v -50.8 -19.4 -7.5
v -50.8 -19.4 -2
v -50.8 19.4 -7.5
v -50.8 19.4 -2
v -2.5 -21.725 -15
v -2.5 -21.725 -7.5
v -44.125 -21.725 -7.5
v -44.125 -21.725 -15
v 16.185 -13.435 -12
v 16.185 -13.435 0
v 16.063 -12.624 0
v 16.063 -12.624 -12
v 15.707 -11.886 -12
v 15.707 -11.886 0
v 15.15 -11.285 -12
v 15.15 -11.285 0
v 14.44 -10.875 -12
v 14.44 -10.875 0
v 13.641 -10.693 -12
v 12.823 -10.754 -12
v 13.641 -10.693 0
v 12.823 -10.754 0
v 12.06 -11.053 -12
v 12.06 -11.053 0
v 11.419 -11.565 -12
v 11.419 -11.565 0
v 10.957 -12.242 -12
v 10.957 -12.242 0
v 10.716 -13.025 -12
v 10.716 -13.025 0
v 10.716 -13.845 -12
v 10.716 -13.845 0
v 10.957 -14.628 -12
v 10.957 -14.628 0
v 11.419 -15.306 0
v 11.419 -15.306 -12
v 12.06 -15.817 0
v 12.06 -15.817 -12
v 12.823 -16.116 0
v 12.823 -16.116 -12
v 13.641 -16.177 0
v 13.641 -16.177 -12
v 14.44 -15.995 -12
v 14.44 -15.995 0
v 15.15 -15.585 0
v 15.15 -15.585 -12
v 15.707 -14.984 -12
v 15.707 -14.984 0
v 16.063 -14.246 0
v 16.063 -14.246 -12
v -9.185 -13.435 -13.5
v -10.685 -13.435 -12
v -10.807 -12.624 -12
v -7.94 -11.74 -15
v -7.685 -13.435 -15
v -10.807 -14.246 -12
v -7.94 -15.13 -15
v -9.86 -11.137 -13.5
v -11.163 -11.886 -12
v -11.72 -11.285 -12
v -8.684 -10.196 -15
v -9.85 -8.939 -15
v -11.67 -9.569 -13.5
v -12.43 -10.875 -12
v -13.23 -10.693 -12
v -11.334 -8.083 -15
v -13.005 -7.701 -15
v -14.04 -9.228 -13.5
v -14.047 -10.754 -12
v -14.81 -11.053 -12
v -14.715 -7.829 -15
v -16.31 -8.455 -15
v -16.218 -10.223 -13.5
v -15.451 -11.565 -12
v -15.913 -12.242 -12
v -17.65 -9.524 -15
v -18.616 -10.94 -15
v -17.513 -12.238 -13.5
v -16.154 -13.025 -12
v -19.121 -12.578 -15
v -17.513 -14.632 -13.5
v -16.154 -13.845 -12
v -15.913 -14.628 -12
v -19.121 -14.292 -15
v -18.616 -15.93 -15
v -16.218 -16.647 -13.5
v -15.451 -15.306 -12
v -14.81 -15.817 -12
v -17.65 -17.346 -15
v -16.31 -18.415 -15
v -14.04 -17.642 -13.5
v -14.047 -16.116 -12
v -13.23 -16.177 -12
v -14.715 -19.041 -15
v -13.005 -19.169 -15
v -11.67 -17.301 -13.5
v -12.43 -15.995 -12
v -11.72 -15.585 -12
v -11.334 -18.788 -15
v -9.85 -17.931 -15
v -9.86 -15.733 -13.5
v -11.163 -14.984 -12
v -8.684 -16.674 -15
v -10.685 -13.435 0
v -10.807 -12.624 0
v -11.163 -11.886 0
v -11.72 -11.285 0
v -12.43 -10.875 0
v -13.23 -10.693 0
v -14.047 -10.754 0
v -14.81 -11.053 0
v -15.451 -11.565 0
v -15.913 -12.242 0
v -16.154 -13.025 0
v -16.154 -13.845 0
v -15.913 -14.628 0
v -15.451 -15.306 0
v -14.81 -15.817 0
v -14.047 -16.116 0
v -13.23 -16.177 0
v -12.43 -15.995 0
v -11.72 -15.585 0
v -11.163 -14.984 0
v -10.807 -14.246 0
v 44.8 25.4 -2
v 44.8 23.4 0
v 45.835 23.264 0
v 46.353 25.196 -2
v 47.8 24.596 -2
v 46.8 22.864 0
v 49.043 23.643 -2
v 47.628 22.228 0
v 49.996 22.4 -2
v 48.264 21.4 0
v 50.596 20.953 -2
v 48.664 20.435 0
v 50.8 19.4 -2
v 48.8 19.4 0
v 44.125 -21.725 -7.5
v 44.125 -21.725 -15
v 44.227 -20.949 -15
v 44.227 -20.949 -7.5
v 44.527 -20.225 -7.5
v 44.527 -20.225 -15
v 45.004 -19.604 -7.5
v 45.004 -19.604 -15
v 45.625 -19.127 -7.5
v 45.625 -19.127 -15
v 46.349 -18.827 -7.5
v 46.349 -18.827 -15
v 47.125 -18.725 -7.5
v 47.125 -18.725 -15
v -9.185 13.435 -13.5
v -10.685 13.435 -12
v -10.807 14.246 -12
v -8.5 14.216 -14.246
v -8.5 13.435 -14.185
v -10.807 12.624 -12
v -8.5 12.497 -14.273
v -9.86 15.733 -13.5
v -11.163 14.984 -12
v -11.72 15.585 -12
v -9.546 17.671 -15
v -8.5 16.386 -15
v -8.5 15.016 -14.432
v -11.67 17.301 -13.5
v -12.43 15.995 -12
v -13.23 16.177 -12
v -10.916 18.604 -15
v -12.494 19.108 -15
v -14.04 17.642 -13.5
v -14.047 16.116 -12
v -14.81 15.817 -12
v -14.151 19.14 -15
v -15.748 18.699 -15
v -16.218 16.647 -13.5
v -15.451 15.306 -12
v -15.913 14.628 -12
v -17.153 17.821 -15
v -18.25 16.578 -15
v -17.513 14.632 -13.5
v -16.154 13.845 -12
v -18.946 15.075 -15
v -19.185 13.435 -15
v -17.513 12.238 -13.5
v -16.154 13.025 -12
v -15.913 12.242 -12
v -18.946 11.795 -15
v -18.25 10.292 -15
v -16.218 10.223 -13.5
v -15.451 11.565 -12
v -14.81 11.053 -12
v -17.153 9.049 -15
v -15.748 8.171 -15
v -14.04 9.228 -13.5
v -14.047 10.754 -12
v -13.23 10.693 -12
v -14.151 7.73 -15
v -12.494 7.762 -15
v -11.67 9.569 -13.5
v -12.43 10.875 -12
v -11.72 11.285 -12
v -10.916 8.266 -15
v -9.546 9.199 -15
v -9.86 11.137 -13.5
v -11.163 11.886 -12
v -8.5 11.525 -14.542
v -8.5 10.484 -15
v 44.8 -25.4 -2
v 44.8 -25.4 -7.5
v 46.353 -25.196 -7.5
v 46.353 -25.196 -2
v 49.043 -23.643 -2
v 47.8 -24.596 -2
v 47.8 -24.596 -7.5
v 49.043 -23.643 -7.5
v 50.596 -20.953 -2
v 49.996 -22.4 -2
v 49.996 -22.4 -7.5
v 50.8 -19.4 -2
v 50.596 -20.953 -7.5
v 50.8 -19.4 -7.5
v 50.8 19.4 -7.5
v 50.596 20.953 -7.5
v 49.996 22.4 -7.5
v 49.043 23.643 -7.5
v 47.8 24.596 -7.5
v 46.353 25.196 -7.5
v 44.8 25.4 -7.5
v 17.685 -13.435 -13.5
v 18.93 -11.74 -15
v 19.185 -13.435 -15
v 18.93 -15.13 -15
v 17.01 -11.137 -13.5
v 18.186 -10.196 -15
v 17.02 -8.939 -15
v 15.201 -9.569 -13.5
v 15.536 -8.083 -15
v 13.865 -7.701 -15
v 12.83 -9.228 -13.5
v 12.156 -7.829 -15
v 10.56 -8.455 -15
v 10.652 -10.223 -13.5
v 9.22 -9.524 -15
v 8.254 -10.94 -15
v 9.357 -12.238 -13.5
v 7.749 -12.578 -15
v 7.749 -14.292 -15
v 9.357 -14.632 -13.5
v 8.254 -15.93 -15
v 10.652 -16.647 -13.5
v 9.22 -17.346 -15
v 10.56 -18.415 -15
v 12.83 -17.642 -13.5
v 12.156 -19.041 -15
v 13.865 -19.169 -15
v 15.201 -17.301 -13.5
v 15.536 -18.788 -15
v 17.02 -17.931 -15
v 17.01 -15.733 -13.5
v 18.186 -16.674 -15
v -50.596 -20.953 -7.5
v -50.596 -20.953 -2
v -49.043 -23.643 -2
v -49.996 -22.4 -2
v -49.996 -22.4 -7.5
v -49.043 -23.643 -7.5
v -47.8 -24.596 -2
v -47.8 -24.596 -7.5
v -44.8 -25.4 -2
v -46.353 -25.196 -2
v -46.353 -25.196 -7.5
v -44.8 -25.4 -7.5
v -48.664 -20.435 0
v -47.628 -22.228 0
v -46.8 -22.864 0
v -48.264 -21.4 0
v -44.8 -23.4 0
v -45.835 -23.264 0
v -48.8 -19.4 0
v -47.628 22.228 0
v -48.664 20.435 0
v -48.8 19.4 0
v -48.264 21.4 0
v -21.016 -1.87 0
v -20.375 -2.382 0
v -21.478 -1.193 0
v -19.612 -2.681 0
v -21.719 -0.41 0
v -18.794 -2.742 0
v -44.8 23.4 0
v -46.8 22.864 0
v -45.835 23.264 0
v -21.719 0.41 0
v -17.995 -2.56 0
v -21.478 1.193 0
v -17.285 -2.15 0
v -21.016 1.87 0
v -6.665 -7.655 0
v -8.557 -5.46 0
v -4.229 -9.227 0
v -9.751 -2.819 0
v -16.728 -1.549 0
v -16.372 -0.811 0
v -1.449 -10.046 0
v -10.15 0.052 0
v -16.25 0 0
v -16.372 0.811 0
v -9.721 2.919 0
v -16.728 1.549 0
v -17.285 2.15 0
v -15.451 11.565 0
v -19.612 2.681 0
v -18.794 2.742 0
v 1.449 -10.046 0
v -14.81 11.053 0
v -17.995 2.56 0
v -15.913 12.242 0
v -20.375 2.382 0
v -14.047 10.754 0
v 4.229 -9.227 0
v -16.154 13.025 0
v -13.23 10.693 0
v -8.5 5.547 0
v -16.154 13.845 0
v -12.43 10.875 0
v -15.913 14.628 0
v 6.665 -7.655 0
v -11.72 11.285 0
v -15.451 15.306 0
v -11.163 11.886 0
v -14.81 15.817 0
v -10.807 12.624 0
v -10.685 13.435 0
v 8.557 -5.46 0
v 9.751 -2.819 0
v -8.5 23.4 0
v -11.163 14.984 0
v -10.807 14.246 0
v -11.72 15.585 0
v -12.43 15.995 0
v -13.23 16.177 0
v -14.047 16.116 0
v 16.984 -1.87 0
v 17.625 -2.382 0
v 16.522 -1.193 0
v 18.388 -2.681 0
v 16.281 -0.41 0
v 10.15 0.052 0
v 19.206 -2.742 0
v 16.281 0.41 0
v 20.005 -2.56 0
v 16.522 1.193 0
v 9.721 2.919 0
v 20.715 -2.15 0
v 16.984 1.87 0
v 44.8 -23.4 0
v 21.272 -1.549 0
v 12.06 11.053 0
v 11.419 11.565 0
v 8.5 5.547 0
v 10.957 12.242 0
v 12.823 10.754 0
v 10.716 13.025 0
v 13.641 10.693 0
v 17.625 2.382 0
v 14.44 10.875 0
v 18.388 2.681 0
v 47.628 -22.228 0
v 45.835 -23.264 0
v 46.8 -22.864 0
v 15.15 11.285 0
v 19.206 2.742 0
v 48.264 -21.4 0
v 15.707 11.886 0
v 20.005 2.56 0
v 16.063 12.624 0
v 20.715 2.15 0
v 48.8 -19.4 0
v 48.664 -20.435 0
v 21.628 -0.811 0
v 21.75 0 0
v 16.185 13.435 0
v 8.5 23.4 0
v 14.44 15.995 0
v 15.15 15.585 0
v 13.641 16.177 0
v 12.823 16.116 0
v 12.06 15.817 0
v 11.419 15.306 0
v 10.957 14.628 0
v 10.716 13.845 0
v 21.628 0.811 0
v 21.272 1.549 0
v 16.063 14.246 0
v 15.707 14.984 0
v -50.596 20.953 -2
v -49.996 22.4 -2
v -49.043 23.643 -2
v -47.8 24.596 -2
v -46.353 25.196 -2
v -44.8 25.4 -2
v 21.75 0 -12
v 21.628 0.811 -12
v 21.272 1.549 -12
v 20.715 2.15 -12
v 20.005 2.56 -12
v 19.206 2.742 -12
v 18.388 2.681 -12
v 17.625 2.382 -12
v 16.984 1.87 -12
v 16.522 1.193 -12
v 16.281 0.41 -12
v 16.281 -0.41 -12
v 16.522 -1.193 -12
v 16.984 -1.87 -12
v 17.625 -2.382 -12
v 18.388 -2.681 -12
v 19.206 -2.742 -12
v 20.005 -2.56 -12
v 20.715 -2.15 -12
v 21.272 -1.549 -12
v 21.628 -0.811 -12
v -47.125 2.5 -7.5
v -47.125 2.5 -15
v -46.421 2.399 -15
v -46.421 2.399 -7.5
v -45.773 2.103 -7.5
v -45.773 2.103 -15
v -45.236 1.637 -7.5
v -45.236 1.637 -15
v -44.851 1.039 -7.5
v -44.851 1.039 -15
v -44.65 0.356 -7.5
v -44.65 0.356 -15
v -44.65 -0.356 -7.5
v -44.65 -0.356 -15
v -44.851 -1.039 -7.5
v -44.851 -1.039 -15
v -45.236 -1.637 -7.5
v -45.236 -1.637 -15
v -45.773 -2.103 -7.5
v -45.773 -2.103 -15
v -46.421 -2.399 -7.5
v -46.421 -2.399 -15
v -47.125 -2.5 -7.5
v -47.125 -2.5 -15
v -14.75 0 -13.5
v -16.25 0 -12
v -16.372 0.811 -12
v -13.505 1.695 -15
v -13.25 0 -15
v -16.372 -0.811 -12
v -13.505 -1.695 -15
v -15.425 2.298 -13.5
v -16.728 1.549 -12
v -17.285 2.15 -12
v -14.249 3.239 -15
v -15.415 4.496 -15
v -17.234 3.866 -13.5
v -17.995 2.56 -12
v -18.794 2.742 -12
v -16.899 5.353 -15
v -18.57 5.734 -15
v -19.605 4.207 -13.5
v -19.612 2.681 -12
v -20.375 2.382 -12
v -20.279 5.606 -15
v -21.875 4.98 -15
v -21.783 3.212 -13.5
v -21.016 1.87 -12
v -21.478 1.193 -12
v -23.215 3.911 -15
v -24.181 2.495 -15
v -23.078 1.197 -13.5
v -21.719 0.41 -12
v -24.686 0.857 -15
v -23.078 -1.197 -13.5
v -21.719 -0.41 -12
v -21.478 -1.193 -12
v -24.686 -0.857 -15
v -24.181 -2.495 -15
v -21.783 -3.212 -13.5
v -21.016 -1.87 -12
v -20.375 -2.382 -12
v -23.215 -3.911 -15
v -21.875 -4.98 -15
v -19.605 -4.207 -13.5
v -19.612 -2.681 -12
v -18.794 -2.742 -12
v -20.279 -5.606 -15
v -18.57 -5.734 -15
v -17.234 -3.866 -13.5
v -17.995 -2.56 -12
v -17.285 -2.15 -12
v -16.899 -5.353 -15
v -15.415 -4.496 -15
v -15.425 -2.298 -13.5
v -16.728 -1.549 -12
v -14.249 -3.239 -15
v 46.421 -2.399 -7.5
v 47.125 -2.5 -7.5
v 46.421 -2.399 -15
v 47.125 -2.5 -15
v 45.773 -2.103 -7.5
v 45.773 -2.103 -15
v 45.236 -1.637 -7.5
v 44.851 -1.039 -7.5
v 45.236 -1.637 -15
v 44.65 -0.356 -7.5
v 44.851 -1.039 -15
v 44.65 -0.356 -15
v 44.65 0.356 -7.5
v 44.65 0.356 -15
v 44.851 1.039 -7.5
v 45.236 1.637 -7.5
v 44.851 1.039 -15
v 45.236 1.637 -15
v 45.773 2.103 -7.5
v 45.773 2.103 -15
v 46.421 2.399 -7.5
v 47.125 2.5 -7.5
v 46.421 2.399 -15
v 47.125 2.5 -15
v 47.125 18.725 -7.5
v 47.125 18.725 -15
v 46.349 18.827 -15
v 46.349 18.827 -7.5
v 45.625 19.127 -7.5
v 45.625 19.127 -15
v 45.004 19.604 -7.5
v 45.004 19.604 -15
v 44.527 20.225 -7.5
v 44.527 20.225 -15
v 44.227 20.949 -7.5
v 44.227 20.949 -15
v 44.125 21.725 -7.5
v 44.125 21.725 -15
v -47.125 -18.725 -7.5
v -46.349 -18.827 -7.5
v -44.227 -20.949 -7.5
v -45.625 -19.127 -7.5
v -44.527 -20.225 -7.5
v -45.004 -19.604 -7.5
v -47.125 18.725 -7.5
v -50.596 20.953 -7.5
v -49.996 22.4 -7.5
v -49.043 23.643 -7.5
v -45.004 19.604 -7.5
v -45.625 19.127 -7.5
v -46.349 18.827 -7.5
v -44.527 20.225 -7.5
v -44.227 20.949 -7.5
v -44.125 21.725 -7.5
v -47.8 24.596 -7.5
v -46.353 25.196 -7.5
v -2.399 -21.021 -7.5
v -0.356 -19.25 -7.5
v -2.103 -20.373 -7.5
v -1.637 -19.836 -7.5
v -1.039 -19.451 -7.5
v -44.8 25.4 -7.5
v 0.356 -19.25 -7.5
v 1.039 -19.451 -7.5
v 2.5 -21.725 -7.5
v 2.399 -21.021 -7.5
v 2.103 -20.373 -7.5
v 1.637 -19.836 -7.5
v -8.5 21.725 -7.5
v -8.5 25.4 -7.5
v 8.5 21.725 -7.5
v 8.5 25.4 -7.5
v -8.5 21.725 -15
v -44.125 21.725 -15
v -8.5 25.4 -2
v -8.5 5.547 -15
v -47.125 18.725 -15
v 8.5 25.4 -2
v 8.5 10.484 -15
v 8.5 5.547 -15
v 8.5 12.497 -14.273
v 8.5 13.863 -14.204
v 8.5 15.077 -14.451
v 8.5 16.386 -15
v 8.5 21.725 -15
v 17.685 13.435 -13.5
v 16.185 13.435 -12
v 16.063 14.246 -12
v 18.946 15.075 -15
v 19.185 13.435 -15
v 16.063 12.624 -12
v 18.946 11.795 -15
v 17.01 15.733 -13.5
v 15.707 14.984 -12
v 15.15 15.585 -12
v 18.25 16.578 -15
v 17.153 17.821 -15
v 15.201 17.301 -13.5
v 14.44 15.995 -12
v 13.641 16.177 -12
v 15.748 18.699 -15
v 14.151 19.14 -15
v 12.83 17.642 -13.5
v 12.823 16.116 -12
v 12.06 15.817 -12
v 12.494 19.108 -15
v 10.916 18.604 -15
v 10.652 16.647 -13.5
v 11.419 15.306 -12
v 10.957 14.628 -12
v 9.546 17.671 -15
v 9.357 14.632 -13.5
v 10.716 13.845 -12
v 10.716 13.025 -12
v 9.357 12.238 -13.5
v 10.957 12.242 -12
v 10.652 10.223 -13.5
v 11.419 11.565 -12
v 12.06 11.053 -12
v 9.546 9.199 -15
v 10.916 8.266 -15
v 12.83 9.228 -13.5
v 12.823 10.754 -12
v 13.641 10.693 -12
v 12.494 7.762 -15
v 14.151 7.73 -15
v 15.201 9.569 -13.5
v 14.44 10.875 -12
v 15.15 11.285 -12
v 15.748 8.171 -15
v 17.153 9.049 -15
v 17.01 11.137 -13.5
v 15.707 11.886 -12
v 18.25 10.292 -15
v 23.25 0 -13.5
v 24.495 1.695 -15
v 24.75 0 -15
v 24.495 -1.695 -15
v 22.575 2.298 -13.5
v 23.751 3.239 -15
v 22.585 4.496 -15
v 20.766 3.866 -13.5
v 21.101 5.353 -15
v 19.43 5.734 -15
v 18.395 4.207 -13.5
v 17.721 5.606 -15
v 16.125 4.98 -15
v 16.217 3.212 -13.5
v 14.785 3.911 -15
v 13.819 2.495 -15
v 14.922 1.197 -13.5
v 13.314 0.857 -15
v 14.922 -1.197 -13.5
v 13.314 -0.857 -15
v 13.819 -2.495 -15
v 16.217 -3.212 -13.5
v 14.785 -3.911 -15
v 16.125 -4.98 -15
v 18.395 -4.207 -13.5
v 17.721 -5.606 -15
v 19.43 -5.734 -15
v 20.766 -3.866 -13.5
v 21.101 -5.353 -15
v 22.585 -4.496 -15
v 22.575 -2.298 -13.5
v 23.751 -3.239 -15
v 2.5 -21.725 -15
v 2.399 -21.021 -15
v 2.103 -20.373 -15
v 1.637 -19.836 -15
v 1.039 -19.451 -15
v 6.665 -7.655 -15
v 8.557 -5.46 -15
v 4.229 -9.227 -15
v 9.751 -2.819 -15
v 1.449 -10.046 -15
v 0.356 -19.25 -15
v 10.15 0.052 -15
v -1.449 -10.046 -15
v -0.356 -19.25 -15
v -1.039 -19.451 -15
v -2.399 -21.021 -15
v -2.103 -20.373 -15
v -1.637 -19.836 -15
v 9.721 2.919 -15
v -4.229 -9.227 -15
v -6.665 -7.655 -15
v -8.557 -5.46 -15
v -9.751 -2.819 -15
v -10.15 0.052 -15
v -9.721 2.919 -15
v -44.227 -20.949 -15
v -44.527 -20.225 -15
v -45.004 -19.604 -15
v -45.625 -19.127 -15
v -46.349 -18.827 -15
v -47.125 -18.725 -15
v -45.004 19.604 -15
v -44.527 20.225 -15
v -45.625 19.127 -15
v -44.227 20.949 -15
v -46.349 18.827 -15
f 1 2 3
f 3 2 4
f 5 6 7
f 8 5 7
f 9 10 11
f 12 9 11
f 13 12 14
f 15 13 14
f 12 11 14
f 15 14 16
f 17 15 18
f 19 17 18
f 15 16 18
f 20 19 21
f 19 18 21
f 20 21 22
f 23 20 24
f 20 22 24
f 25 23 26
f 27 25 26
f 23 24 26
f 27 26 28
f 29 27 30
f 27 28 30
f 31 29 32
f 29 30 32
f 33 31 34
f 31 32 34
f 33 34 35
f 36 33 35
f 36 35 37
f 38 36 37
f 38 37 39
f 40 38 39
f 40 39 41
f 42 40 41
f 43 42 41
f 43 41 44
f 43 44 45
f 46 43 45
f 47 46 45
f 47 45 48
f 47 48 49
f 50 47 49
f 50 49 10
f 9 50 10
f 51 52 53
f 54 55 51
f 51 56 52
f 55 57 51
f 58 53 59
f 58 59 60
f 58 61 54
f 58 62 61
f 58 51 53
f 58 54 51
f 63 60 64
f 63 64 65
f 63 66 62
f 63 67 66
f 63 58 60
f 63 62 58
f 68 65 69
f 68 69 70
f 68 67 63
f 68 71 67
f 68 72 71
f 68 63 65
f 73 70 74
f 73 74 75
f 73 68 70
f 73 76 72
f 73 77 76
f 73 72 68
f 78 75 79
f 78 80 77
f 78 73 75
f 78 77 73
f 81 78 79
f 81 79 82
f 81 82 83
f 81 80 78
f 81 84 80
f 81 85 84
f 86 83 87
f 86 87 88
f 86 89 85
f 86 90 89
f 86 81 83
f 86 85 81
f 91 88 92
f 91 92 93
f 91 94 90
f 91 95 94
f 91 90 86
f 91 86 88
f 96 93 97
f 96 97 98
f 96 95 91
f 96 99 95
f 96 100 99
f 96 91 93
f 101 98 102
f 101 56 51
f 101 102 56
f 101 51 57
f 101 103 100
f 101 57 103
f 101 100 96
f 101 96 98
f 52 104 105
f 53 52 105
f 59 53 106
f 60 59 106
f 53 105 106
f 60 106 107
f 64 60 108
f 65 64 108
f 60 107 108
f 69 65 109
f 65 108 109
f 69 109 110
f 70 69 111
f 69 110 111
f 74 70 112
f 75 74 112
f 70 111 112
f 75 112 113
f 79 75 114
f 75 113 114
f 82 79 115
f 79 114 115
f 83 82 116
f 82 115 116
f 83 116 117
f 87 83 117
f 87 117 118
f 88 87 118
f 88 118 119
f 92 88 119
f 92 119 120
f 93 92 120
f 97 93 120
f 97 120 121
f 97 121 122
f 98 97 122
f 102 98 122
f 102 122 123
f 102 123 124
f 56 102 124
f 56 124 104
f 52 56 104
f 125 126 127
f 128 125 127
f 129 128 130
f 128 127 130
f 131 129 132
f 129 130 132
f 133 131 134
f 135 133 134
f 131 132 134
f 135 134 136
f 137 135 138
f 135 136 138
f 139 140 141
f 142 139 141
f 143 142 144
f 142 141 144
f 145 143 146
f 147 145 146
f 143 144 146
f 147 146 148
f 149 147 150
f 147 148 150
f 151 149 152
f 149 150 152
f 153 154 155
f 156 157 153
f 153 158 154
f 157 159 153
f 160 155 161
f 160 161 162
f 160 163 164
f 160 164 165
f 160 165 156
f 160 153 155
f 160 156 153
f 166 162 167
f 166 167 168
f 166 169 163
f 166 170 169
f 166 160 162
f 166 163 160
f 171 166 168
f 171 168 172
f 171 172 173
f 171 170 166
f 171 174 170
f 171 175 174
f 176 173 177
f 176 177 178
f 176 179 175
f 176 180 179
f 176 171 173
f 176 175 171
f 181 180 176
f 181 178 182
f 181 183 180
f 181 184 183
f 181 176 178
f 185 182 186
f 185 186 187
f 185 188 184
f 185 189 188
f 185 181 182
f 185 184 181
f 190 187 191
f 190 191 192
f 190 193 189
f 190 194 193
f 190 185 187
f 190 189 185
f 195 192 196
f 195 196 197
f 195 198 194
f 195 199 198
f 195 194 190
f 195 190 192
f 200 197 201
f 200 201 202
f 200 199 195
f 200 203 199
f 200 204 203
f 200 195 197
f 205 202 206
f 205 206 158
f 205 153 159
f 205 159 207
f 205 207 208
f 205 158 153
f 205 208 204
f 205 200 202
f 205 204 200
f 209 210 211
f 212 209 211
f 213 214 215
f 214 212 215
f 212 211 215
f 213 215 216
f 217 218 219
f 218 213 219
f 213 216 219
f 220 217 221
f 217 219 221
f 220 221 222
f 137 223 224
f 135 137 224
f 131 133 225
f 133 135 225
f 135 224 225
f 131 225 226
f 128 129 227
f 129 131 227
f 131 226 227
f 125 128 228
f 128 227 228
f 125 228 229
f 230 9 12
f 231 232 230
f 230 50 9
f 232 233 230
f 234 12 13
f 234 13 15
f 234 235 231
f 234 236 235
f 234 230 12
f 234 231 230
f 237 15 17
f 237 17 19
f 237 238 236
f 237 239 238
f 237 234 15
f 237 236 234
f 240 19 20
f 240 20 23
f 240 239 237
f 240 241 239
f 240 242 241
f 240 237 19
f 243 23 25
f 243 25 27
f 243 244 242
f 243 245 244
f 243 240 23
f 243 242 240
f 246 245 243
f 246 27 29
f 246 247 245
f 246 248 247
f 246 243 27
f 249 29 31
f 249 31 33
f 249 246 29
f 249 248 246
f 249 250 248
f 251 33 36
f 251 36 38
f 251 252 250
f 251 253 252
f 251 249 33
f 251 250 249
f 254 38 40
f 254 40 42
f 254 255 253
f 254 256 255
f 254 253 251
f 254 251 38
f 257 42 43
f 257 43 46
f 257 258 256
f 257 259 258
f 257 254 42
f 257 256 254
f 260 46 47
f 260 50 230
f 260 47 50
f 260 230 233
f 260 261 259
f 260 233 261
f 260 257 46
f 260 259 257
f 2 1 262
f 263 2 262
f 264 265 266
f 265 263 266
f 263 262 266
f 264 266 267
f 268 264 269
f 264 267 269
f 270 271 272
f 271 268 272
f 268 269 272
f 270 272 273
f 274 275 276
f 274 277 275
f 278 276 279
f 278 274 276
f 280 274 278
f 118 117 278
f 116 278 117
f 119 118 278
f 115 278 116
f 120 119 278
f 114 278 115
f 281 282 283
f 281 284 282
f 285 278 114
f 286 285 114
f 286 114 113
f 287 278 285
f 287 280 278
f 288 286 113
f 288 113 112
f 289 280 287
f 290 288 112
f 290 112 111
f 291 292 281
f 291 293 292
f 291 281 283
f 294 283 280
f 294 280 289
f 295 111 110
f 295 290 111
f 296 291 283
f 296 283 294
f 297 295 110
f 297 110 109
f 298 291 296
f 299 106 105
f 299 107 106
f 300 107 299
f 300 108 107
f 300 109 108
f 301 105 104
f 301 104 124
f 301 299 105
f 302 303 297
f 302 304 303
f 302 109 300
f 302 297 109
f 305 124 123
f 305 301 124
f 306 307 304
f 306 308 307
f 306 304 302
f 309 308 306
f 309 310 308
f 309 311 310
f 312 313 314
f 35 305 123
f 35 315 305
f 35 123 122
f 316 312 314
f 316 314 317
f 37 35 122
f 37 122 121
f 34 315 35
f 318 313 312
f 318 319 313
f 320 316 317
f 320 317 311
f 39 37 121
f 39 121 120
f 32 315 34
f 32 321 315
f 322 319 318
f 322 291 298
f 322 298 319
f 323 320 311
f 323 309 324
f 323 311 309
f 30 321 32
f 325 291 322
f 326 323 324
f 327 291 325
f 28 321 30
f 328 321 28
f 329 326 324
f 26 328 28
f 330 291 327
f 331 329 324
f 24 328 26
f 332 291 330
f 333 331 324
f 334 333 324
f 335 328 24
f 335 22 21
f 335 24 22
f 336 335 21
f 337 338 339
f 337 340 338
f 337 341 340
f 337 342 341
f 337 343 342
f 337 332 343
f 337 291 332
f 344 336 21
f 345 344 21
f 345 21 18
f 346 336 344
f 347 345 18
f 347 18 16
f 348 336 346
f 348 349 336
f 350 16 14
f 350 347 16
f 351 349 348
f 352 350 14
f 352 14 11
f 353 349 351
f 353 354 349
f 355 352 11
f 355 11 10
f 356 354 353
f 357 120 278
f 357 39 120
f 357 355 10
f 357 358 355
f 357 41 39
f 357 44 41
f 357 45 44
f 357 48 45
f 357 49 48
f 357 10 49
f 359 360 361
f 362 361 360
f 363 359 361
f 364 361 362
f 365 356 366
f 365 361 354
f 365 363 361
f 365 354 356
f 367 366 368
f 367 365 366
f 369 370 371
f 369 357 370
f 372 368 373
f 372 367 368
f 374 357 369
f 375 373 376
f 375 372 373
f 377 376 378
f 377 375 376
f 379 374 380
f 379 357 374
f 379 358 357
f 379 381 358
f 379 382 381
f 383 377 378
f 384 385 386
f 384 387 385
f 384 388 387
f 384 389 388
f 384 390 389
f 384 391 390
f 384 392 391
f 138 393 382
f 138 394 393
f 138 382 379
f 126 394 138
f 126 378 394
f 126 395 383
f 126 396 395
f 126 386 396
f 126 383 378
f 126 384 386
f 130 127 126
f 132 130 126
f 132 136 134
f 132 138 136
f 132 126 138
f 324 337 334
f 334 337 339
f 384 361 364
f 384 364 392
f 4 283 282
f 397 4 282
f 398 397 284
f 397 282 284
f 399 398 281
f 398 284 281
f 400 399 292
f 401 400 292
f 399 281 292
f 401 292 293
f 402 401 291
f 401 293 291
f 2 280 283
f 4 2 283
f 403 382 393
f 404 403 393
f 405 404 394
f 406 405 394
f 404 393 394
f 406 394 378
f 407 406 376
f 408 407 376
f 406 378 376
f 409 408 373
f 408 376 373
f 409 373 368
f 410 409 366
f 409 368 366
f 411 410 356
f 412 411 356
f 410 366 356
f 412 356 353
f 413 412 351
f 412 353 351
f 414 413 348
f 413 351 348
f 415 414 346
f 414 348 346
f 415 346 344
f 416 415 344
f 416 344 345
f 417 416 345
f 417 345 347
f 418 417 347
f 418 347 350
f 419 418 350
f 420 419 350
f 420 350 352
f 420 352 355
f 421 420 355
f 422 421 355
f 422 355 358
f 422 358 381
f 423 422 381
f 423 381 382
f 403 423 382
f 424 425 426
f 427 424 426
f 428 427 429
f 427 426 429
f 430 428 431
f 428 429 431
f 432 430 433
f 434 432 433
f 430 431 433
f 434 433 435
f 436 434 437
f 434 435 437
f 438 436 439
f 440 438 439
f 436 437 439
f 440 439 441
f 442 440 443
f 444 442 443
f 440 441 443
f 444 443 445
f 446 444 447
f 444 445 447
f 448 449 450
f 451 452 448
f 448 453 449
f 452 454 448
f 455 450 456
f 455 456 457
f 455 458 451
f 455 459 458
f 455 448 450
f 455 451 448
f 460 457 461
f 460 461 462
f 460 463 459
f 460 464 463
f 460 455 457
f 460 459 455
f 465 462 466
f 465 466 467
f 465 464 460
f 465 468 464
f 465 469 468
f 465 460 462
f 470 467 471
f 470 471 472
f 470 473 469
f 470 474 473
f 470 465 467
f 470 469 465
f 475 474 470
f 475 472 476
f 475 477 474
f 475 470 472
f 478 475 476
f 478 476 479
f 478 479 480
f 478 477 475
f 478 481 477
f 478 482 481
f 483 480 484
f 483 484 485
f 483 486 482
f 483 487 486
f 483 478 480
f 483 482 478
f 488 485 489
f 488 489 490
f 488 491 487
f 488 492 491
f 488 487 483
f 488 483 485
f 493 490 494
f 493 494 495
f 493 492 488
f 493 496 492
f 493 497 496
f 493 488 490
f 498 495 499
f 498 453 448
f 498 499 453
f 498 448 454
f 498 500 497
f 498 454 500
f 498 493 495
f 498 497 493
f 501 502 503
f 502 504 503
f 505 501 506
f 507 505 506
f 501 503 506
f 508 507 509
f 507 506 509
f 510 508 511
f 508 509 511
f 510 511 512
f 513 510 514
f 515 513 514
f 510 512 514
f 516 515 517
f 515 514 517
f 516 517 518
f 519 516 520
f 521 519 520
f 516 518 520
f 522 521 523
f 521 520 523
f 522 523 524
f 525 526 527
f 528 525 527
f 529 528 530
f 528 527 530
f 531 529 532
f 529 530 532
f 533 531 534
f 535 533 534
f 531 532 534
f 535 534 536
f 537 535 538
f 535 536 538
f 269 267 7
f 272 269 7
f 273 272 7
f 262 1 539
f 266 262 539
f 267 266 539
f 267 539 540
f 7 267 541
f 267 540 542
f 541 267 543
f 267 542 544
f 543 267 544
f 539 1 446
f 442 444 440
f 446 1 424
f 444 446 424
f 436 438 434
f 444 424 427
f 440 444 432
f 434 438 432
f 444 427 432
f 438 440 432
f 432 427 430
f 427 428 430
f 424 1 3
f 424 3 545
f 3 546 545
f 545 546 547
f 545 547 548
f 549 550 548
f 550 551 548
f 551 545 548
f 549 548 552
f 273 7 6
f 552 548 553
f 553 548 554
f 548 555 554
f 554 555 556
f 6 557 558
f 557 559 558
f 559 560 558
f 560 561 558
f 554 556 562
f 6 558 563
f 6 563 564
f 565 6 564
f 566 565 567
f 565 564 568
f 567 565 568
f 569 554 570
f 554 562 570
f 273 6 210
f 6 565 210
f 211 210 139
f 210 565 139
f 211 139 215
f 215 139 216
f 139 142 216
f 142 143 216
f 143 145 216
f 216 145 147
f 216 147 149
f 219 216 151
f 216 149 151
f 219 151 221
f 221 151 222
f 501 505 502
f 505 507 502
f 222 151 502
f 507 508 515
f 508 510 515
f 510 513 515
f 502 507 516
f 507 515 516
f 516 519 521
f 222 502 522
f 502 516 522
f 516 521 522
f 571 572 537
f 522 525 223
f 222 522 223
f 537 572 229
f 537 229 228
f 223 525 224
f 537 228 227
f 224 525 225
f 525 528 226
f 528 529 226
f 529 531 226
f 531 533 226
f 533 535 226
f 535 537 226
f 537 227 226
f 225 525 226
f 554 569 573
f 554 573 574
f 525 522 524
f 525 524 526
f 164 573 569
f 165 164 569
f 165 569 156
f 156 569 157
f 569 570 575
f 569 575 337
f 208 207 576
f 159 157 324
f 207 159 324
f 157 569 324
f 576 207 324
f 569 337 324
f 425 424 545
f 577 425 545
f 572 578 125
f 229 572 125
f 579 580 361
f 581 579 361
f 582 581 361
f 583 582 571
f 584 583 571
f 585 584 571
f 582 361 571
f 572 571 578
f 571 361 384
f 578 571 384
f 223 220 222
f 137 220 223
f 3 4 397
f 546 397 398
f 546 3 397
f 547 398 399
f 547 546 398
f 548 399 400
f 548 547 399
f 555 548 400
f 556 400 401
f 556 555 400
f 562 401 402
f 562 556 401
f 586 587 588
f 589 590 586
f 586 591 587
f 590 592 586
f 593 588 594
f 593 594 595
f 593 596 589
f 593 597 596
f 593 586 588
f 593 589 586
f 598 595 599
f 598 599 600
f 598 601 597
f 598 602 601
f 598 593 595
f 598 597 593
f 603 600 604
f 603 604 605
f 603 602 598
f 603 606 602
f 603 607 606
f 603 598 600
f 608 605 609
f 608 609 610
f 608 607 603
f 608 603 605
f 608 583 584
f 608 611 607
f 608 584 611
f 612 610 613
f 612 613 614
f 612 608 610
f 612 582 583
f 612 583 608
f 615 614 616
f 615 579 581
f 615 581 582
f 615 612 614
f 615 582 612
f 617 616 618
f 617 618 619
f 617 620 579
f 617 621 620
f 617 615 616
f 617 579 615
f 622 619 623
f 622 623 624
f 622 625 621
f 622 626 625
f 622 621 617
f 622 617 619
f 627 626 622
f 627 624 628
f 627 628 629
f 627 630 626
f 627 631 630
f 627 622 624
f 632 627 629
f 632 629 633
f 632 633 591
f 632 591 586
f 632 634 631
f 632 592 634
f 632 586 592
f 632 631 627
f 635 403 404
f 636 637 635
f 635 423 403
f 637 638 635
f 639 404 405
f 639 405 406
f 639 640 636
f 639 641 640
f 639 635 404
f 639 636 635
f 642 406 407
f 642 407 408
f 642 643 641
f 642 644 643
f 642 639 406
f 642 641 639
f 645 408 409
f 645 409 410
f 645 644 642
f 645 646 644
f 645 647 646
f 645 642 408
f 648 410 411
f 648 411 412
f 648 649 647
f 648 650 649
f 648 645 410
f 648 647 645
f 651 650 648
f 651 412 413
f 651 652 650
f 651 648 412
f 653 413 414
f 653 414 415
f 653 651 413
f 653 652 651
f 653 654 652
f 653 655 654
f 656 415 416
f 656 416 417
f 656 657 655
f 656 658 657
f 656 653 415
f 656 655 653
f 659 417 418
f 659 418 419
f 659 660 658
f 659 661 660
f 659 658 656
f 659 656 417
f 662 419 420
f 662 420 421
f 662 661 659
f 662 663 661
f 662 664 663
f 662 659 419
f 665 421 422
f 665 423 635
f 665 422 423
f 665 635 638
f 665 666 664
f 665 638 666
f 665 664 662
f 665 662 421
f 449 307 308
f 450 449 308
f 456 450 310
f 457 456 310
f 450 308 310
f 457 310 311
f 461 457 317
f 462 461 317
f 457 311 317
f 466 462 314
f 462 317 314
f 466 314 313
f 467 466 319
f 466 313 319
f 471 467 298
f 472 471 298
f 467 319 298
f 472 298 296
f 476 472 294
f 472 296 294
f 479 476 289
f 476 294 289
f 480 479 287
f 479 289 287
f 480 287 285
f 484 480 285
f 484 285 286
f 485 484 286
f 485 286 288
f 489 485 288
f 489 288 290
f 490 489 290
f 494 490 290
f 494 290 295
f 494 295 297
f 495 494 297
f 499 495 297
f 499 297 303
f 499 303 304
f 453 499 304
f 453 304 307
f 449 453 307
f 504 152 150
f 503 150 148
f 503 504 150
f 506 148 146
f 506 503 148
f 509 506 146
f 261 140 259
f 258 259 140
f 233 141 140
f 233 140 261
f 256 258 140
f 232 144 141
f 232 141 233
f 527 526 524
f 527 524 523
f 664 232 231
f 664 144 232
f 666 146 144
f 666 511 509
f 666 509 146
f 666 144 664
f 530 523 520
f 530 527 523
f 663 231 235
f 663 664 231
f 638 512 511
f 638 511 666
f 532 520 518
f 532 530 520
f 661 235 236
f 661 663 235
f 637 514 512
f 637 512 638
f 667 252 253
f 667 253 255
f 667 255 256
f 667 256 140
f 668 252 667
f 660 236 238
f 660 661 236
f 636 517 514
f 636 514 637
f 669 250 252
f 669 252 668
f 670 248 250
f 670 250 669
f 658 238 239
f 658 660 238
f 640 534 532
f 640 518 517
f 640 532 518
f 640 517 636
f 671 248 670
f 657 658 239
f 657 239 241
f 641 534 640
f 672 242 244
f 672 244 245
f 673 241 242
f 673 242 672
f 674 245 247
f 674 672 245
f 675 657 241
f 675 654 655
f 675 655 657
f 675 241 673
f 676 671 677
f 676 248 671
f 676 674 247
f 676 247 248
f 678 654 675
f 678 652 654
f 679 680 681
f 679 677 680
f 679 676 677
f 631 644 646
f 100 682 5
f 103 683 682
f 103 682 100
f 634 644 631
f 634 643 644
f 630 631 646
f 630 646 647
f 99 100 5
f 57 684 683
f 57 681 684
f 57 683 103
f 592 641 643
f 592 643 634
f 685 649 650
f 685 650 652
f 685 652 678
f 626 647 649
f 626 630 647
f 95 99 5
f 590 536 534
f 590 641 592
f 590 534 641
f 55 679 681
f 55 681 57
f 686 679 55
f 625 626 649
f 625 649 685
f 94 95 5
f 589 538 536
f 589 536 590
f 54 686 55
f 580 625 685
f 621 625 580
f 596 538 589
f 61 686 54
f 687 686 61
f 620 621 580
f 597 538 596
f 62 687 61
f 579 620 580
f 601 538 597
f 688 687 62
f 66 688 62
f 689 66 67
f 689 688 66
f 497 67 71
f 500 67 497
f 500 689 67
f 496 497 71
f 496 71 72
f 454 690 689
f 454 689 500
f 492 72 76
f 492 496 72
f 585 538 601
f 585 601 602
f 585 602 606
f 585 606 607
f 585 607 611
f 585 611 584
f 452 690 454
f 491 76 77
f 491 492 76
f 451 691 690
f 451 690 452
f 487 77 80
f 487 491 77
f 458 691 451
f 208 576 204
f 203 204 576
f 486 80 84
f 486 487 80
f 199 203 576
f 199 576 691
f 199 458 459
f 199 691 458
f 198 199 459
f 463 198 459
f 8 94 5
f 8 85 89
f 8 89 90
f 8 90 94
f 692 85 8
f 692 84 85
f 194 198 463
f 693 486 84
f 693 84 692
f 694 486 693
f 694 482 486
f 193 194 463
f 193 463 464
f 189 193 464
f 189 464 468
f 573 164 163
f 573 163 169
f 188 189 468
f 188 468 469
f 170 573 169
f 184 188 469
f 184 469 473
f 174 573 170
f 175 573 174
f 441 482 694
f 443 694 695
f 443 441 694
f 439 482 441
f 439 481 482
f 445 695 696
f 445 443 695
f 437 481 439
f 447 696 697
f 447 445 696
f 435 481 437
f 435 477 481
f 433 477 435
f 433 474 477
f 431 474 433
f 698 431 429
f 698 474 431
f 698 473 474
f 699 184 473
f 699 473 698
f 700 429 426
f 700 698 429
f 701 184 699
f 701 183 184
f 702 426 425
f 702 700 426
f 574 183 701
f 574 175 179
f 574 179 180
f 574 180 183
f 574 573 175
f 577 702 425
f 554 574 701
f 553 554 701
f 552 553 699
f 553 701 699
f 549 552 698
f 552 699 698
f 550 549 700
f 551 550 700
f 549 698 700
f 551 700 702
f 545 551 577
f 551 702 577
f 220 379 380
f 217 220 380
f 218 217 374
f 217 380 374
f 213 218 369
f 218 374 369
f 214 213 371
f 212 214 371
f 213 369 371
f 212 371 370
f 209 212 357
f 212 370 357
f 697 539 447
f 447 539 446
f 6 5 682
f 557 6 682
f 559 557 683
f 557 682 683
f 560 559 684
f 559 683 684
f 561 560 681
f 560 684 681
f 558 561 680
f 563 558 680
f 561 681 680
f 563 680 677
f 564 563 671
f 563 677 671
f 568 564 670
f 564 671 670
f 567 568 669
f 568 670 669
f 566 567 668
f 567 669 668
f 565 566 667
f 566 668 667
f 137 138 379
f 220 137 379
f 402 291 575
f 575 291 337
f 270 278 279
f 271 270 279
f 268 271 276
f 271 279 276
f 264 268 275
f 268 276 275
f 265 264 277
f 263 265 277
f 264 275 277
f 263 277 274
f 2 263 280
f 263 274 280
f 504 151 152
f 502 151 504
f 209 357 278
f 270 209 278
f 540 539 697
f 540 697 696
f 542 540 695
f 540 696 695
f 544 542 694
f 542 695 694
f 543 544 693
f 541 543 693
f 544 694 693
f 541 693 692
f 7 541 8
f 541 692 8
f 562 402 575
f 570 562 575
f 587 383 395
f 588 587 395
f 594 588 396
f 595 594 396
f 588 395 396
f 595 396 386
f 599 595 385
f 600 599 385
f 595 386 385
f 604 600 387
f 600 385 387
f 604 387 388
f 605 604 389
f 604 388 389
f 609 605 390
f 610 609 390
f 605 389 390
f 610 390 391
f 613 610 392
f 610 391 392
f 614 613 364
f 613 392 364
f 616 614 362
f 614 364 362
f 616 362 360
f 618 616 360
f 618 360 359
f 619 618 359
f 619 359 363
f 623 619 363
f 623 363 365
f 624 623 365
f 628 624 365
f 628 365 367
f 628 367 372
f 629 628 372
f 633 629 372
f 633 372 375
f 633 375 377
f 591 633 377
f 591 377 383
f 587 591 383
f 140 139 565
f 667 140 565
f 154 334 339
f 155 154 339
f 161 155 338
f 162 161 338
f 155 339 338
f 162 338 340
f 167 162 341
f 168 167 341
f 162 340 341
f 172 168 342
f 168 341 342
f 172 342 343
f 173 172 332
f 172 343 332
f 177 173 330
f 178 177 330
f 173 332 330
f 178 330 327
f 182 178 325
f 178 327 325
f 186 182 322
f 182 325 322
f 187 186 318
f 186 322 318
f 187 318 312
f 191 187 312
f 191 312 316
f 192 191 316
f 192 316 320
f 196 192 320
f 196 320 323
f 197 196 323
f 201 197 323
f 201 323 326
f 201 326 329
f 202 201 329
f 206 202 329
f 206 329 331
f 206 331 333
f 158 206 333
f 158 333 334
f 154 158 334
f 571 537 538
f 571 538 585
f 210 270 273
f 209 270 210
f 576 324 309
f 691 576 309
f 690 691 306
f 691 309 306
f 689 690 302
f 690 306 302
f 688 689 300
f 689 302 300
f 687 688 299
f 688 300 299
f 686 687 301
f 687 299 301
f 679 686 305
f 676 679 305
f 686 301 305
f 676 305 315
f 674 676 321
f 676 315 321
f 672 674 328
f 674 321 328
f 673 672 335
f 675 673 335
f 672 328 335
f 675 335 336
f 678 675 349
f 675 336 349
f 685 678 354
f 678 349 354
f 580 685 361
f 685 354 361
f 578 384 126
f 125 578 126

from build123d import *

# Parameters (mm, degrees)
SKETCH1_W           = 101.6
SKETCH1_H           = 50.8
BOSS_EXTRUDE1_DEPTH = 7.5
SKETCH2_W           = 94.25
SKETCH2_H           = 43.45
BOSS_EXTRUDE2_DEPTH = 7.5
SKETCH3_R           = 2.75
CUT_EXTRUDE1_DEPTH  = 59.74351028
FILLET1_R           = 6
SKETCH4_R           = 3
SKETCH4_R_2         = 2.5
CUT_EXTRUDE2_DEPTH  = 7.5
CHAMFER1_SIZE       = 2
CHAMFER2_SIZE       = 3


with BuildPart() as part:
    # Sketch1 → Boss-Extrude1 (new body)
    with BuildSketch(Plane.XY):
        Rectangle(SKETCH1_W, SKETCH1_H)
    extrude(amount=-BOSS_EXTRUDE1_DEPTH)

    # Sketch2 → Boss-Extrude2 (add)
    with BuildSketch(Plane(origin=(0, 0, -7.5), x_dir=(-1, 0, 0), z_dir=(0, 0, -1))):
        Rectangle(SKETCH2_W, SKETCH2_H)
    extrude(amount=BOSS_EXTRUDE2_DEPTH)

    # Sketch3 → Cut-Extrude1 (cut, through all)
    with BuildSketch(Plane.XY):
        with Locations((-19, 0)):
            Circle(SKETCH3_R)
        with Locations((-13.435028843, 13.435028843)):
            Circle(SKETCH3_R)
        with Locations((13.435028843, 13.435028843)):
            Circle(SKETCH3_R)
        with Locations((19, 0)):
            Circle(SKETCH3_R)
        with Locations((13.435028843, -13.435028843)):
            Circle(SKETCH3_R)
        with Locations((-13.435028843, -13.435028843)):
            Circle(SKETCH3_R)
        with BuildLine():
            Line((8.5, 5.547296639), (8.5, 25.4))
            Line((8.5, 25.4), (-8.5, 25.4))
            Line((-8.5, 25.4), (-8.5, 5.547296639))
            ThreePointArc((-8.5, 5.547296639), (0, -10.15), (8.5, 5.547296639))
        make_face()
    extrude(amount=-CUT_EXTRUDE1_DEPTH, mode=Mode.SUBTRACT)

    # Fillet1
    fillet1_edges = [part.edges().sort_by_distance(p)[0] for p in [
        (-50.8, 25.4, -3.75),
        (50.8, 25.4, -3.75),
        (50.8, -25.4, -3.75),
        (-50.8, -25.4, -3.75),
    ]]
    fillet(fillet1_edges, radius=FILLET1_R)

    # Sketch4 → Cut-Extrude2 (cut)
    with BuildSketch(Plane(origin=(0, 0, -15), x_dir=(-1, 0, 0), z_dir=(0, 0, -1))):
        with Locations((-47.125, 21.725)):
            Circle(SKETCH4_R)
        with Locations((-47.125, -21.725)):
            Circle(SKETCH4_R)
        with Locations((-47.125, 0)):
            Circle(SKETCH4_R_2)
        with Locations((0, -21.725)):
            Circle(SKETCH4_R_2)
        with Locations((47.125, -21.725)):
            Circle(SKETCH4_R)
        with Locations((47.125, 0)):
            Circle(SKETCH4_R_2)
        with Locations((47.125, 21.725)):
            Circle(SKETCH4_R)
    extrude(amount=-CUT_EXTRUDE2_DEPTH, mode=Mode.SUBTRACT)

    # Chamfer1
    chamfer1_edges = [part.edges().sort_by_distance(p)[0] for p in [
        (-26.65, 25.4, 0),
        (0, -25.4, 0),
        (-50.8, 0, 0),
        (50.8, 0, 0),
        (26.65, 25.4, 0),
        (49.042640687, 23.642640687, 0),
        (-49.042640687, 23.642640687, 0),
        (-49.042640687, -23.642640687, 0),
        (49.042640687, -23.642640687, 0),
    ]]
    chamfer(chamfer1_edges, length=CHAMFER1_SIZE)

    # Chamfer2
    # the kernel refuses this chamfer: 3 mm, written as the material it takes off along each edge
    with BuildSketch(Plane(origin=(-13.435028843, -13.435028843, -15), x_dir=(1, 0, 0), z_dir=(0, -1, 0))) as chamfer2_piece_1:
        Polygon((2.75, CHAMFER2_SIZE), (2.75 + CHAMFER2_SIZE, 0), (2.75, 0), align=None)
    revolve(axis=Axis((-13.435028843, -13.435028843, -15), (0, 0, 1)), mode=Mode.SUBTRACT)
    with BuildSketch(Plane(origin=(13.435028843, -13.435028843, -15), x_dir=(1, 0, 0), z_dir=(0, -1, 0))) as chamfer2_piece_2:
        Polygon((2.75, CHAMFER2_SIZE), (2.75 + CHAMFER2_SIZE, 0), (2.75, 0), align=None)
    revolve(axis=Axis((13.435028843, -13.435028843, -15), (0, 0, 1)), mode=Mode.SUBTRACT)
    with BuildSketch(Plane(origin=(19, 0, -15), x_dir=(1, 0, 0), z_dir=(0, -1, 0))) as chamfer2_piece_3:
        Polygon((2.75, CHAMFER2_SIZE), (2.75 + CHAMFER2_SIZE, 0), (2.75, 0), align=None)
    revolve(axis=Axis((19, 0, -15), (0, 0, 1)), mode=Mode.SUBTRACT)
    with BuildSketch(Plane(origin=(13.435028843, 13.435028843, -15), x_dir=(1, 0, 0), z_dir=(0, -1, 0))) as chamfer2_piece_4:
        Polygon((2.75, CHAMFER2_SIZE), (2.75 + CHAMFER2_SIZE, 0), (2.75, 0), align=None)
    revolve(axis=Axis((13.435028843, 13.435028843, -15), (0, 0, 1)), mode=Mode.SUBTRACT)
    with BuildSketch(Plane(origin=(-13.435028843, 13.435028843, -15), x_dir=(1, 0, 0), z_dir=(0, -1, 0))) as chamfer2_piece_5:
        Polygon((2.75, CHAMFER2_SIZE), (2.75 + CHAMFER2_SIZE, 0), (2.75, 0), align=None)
    revolve(axis=Axis((-13.435028843, 13.435028843, -15), (0, 0, 1)), mode=Mode.SUBTRACT)
    with BuildSketch(Plane(origin=(-19, 0, -15), x_dir=(1, 0, 0), z_dir=(0, -1, 0))) as chamfer2_piece_6:
        Polygon((2.75, CHAMFER2_SIZE), (2.75 + CHAMFER2_SIZE, 0), (2.75, 0), align=None)
    revolve(axis=Axis((-19, 0, -15), (0, 0, 1)), mode=Mode.SUBTRACT)


solid = part.part
